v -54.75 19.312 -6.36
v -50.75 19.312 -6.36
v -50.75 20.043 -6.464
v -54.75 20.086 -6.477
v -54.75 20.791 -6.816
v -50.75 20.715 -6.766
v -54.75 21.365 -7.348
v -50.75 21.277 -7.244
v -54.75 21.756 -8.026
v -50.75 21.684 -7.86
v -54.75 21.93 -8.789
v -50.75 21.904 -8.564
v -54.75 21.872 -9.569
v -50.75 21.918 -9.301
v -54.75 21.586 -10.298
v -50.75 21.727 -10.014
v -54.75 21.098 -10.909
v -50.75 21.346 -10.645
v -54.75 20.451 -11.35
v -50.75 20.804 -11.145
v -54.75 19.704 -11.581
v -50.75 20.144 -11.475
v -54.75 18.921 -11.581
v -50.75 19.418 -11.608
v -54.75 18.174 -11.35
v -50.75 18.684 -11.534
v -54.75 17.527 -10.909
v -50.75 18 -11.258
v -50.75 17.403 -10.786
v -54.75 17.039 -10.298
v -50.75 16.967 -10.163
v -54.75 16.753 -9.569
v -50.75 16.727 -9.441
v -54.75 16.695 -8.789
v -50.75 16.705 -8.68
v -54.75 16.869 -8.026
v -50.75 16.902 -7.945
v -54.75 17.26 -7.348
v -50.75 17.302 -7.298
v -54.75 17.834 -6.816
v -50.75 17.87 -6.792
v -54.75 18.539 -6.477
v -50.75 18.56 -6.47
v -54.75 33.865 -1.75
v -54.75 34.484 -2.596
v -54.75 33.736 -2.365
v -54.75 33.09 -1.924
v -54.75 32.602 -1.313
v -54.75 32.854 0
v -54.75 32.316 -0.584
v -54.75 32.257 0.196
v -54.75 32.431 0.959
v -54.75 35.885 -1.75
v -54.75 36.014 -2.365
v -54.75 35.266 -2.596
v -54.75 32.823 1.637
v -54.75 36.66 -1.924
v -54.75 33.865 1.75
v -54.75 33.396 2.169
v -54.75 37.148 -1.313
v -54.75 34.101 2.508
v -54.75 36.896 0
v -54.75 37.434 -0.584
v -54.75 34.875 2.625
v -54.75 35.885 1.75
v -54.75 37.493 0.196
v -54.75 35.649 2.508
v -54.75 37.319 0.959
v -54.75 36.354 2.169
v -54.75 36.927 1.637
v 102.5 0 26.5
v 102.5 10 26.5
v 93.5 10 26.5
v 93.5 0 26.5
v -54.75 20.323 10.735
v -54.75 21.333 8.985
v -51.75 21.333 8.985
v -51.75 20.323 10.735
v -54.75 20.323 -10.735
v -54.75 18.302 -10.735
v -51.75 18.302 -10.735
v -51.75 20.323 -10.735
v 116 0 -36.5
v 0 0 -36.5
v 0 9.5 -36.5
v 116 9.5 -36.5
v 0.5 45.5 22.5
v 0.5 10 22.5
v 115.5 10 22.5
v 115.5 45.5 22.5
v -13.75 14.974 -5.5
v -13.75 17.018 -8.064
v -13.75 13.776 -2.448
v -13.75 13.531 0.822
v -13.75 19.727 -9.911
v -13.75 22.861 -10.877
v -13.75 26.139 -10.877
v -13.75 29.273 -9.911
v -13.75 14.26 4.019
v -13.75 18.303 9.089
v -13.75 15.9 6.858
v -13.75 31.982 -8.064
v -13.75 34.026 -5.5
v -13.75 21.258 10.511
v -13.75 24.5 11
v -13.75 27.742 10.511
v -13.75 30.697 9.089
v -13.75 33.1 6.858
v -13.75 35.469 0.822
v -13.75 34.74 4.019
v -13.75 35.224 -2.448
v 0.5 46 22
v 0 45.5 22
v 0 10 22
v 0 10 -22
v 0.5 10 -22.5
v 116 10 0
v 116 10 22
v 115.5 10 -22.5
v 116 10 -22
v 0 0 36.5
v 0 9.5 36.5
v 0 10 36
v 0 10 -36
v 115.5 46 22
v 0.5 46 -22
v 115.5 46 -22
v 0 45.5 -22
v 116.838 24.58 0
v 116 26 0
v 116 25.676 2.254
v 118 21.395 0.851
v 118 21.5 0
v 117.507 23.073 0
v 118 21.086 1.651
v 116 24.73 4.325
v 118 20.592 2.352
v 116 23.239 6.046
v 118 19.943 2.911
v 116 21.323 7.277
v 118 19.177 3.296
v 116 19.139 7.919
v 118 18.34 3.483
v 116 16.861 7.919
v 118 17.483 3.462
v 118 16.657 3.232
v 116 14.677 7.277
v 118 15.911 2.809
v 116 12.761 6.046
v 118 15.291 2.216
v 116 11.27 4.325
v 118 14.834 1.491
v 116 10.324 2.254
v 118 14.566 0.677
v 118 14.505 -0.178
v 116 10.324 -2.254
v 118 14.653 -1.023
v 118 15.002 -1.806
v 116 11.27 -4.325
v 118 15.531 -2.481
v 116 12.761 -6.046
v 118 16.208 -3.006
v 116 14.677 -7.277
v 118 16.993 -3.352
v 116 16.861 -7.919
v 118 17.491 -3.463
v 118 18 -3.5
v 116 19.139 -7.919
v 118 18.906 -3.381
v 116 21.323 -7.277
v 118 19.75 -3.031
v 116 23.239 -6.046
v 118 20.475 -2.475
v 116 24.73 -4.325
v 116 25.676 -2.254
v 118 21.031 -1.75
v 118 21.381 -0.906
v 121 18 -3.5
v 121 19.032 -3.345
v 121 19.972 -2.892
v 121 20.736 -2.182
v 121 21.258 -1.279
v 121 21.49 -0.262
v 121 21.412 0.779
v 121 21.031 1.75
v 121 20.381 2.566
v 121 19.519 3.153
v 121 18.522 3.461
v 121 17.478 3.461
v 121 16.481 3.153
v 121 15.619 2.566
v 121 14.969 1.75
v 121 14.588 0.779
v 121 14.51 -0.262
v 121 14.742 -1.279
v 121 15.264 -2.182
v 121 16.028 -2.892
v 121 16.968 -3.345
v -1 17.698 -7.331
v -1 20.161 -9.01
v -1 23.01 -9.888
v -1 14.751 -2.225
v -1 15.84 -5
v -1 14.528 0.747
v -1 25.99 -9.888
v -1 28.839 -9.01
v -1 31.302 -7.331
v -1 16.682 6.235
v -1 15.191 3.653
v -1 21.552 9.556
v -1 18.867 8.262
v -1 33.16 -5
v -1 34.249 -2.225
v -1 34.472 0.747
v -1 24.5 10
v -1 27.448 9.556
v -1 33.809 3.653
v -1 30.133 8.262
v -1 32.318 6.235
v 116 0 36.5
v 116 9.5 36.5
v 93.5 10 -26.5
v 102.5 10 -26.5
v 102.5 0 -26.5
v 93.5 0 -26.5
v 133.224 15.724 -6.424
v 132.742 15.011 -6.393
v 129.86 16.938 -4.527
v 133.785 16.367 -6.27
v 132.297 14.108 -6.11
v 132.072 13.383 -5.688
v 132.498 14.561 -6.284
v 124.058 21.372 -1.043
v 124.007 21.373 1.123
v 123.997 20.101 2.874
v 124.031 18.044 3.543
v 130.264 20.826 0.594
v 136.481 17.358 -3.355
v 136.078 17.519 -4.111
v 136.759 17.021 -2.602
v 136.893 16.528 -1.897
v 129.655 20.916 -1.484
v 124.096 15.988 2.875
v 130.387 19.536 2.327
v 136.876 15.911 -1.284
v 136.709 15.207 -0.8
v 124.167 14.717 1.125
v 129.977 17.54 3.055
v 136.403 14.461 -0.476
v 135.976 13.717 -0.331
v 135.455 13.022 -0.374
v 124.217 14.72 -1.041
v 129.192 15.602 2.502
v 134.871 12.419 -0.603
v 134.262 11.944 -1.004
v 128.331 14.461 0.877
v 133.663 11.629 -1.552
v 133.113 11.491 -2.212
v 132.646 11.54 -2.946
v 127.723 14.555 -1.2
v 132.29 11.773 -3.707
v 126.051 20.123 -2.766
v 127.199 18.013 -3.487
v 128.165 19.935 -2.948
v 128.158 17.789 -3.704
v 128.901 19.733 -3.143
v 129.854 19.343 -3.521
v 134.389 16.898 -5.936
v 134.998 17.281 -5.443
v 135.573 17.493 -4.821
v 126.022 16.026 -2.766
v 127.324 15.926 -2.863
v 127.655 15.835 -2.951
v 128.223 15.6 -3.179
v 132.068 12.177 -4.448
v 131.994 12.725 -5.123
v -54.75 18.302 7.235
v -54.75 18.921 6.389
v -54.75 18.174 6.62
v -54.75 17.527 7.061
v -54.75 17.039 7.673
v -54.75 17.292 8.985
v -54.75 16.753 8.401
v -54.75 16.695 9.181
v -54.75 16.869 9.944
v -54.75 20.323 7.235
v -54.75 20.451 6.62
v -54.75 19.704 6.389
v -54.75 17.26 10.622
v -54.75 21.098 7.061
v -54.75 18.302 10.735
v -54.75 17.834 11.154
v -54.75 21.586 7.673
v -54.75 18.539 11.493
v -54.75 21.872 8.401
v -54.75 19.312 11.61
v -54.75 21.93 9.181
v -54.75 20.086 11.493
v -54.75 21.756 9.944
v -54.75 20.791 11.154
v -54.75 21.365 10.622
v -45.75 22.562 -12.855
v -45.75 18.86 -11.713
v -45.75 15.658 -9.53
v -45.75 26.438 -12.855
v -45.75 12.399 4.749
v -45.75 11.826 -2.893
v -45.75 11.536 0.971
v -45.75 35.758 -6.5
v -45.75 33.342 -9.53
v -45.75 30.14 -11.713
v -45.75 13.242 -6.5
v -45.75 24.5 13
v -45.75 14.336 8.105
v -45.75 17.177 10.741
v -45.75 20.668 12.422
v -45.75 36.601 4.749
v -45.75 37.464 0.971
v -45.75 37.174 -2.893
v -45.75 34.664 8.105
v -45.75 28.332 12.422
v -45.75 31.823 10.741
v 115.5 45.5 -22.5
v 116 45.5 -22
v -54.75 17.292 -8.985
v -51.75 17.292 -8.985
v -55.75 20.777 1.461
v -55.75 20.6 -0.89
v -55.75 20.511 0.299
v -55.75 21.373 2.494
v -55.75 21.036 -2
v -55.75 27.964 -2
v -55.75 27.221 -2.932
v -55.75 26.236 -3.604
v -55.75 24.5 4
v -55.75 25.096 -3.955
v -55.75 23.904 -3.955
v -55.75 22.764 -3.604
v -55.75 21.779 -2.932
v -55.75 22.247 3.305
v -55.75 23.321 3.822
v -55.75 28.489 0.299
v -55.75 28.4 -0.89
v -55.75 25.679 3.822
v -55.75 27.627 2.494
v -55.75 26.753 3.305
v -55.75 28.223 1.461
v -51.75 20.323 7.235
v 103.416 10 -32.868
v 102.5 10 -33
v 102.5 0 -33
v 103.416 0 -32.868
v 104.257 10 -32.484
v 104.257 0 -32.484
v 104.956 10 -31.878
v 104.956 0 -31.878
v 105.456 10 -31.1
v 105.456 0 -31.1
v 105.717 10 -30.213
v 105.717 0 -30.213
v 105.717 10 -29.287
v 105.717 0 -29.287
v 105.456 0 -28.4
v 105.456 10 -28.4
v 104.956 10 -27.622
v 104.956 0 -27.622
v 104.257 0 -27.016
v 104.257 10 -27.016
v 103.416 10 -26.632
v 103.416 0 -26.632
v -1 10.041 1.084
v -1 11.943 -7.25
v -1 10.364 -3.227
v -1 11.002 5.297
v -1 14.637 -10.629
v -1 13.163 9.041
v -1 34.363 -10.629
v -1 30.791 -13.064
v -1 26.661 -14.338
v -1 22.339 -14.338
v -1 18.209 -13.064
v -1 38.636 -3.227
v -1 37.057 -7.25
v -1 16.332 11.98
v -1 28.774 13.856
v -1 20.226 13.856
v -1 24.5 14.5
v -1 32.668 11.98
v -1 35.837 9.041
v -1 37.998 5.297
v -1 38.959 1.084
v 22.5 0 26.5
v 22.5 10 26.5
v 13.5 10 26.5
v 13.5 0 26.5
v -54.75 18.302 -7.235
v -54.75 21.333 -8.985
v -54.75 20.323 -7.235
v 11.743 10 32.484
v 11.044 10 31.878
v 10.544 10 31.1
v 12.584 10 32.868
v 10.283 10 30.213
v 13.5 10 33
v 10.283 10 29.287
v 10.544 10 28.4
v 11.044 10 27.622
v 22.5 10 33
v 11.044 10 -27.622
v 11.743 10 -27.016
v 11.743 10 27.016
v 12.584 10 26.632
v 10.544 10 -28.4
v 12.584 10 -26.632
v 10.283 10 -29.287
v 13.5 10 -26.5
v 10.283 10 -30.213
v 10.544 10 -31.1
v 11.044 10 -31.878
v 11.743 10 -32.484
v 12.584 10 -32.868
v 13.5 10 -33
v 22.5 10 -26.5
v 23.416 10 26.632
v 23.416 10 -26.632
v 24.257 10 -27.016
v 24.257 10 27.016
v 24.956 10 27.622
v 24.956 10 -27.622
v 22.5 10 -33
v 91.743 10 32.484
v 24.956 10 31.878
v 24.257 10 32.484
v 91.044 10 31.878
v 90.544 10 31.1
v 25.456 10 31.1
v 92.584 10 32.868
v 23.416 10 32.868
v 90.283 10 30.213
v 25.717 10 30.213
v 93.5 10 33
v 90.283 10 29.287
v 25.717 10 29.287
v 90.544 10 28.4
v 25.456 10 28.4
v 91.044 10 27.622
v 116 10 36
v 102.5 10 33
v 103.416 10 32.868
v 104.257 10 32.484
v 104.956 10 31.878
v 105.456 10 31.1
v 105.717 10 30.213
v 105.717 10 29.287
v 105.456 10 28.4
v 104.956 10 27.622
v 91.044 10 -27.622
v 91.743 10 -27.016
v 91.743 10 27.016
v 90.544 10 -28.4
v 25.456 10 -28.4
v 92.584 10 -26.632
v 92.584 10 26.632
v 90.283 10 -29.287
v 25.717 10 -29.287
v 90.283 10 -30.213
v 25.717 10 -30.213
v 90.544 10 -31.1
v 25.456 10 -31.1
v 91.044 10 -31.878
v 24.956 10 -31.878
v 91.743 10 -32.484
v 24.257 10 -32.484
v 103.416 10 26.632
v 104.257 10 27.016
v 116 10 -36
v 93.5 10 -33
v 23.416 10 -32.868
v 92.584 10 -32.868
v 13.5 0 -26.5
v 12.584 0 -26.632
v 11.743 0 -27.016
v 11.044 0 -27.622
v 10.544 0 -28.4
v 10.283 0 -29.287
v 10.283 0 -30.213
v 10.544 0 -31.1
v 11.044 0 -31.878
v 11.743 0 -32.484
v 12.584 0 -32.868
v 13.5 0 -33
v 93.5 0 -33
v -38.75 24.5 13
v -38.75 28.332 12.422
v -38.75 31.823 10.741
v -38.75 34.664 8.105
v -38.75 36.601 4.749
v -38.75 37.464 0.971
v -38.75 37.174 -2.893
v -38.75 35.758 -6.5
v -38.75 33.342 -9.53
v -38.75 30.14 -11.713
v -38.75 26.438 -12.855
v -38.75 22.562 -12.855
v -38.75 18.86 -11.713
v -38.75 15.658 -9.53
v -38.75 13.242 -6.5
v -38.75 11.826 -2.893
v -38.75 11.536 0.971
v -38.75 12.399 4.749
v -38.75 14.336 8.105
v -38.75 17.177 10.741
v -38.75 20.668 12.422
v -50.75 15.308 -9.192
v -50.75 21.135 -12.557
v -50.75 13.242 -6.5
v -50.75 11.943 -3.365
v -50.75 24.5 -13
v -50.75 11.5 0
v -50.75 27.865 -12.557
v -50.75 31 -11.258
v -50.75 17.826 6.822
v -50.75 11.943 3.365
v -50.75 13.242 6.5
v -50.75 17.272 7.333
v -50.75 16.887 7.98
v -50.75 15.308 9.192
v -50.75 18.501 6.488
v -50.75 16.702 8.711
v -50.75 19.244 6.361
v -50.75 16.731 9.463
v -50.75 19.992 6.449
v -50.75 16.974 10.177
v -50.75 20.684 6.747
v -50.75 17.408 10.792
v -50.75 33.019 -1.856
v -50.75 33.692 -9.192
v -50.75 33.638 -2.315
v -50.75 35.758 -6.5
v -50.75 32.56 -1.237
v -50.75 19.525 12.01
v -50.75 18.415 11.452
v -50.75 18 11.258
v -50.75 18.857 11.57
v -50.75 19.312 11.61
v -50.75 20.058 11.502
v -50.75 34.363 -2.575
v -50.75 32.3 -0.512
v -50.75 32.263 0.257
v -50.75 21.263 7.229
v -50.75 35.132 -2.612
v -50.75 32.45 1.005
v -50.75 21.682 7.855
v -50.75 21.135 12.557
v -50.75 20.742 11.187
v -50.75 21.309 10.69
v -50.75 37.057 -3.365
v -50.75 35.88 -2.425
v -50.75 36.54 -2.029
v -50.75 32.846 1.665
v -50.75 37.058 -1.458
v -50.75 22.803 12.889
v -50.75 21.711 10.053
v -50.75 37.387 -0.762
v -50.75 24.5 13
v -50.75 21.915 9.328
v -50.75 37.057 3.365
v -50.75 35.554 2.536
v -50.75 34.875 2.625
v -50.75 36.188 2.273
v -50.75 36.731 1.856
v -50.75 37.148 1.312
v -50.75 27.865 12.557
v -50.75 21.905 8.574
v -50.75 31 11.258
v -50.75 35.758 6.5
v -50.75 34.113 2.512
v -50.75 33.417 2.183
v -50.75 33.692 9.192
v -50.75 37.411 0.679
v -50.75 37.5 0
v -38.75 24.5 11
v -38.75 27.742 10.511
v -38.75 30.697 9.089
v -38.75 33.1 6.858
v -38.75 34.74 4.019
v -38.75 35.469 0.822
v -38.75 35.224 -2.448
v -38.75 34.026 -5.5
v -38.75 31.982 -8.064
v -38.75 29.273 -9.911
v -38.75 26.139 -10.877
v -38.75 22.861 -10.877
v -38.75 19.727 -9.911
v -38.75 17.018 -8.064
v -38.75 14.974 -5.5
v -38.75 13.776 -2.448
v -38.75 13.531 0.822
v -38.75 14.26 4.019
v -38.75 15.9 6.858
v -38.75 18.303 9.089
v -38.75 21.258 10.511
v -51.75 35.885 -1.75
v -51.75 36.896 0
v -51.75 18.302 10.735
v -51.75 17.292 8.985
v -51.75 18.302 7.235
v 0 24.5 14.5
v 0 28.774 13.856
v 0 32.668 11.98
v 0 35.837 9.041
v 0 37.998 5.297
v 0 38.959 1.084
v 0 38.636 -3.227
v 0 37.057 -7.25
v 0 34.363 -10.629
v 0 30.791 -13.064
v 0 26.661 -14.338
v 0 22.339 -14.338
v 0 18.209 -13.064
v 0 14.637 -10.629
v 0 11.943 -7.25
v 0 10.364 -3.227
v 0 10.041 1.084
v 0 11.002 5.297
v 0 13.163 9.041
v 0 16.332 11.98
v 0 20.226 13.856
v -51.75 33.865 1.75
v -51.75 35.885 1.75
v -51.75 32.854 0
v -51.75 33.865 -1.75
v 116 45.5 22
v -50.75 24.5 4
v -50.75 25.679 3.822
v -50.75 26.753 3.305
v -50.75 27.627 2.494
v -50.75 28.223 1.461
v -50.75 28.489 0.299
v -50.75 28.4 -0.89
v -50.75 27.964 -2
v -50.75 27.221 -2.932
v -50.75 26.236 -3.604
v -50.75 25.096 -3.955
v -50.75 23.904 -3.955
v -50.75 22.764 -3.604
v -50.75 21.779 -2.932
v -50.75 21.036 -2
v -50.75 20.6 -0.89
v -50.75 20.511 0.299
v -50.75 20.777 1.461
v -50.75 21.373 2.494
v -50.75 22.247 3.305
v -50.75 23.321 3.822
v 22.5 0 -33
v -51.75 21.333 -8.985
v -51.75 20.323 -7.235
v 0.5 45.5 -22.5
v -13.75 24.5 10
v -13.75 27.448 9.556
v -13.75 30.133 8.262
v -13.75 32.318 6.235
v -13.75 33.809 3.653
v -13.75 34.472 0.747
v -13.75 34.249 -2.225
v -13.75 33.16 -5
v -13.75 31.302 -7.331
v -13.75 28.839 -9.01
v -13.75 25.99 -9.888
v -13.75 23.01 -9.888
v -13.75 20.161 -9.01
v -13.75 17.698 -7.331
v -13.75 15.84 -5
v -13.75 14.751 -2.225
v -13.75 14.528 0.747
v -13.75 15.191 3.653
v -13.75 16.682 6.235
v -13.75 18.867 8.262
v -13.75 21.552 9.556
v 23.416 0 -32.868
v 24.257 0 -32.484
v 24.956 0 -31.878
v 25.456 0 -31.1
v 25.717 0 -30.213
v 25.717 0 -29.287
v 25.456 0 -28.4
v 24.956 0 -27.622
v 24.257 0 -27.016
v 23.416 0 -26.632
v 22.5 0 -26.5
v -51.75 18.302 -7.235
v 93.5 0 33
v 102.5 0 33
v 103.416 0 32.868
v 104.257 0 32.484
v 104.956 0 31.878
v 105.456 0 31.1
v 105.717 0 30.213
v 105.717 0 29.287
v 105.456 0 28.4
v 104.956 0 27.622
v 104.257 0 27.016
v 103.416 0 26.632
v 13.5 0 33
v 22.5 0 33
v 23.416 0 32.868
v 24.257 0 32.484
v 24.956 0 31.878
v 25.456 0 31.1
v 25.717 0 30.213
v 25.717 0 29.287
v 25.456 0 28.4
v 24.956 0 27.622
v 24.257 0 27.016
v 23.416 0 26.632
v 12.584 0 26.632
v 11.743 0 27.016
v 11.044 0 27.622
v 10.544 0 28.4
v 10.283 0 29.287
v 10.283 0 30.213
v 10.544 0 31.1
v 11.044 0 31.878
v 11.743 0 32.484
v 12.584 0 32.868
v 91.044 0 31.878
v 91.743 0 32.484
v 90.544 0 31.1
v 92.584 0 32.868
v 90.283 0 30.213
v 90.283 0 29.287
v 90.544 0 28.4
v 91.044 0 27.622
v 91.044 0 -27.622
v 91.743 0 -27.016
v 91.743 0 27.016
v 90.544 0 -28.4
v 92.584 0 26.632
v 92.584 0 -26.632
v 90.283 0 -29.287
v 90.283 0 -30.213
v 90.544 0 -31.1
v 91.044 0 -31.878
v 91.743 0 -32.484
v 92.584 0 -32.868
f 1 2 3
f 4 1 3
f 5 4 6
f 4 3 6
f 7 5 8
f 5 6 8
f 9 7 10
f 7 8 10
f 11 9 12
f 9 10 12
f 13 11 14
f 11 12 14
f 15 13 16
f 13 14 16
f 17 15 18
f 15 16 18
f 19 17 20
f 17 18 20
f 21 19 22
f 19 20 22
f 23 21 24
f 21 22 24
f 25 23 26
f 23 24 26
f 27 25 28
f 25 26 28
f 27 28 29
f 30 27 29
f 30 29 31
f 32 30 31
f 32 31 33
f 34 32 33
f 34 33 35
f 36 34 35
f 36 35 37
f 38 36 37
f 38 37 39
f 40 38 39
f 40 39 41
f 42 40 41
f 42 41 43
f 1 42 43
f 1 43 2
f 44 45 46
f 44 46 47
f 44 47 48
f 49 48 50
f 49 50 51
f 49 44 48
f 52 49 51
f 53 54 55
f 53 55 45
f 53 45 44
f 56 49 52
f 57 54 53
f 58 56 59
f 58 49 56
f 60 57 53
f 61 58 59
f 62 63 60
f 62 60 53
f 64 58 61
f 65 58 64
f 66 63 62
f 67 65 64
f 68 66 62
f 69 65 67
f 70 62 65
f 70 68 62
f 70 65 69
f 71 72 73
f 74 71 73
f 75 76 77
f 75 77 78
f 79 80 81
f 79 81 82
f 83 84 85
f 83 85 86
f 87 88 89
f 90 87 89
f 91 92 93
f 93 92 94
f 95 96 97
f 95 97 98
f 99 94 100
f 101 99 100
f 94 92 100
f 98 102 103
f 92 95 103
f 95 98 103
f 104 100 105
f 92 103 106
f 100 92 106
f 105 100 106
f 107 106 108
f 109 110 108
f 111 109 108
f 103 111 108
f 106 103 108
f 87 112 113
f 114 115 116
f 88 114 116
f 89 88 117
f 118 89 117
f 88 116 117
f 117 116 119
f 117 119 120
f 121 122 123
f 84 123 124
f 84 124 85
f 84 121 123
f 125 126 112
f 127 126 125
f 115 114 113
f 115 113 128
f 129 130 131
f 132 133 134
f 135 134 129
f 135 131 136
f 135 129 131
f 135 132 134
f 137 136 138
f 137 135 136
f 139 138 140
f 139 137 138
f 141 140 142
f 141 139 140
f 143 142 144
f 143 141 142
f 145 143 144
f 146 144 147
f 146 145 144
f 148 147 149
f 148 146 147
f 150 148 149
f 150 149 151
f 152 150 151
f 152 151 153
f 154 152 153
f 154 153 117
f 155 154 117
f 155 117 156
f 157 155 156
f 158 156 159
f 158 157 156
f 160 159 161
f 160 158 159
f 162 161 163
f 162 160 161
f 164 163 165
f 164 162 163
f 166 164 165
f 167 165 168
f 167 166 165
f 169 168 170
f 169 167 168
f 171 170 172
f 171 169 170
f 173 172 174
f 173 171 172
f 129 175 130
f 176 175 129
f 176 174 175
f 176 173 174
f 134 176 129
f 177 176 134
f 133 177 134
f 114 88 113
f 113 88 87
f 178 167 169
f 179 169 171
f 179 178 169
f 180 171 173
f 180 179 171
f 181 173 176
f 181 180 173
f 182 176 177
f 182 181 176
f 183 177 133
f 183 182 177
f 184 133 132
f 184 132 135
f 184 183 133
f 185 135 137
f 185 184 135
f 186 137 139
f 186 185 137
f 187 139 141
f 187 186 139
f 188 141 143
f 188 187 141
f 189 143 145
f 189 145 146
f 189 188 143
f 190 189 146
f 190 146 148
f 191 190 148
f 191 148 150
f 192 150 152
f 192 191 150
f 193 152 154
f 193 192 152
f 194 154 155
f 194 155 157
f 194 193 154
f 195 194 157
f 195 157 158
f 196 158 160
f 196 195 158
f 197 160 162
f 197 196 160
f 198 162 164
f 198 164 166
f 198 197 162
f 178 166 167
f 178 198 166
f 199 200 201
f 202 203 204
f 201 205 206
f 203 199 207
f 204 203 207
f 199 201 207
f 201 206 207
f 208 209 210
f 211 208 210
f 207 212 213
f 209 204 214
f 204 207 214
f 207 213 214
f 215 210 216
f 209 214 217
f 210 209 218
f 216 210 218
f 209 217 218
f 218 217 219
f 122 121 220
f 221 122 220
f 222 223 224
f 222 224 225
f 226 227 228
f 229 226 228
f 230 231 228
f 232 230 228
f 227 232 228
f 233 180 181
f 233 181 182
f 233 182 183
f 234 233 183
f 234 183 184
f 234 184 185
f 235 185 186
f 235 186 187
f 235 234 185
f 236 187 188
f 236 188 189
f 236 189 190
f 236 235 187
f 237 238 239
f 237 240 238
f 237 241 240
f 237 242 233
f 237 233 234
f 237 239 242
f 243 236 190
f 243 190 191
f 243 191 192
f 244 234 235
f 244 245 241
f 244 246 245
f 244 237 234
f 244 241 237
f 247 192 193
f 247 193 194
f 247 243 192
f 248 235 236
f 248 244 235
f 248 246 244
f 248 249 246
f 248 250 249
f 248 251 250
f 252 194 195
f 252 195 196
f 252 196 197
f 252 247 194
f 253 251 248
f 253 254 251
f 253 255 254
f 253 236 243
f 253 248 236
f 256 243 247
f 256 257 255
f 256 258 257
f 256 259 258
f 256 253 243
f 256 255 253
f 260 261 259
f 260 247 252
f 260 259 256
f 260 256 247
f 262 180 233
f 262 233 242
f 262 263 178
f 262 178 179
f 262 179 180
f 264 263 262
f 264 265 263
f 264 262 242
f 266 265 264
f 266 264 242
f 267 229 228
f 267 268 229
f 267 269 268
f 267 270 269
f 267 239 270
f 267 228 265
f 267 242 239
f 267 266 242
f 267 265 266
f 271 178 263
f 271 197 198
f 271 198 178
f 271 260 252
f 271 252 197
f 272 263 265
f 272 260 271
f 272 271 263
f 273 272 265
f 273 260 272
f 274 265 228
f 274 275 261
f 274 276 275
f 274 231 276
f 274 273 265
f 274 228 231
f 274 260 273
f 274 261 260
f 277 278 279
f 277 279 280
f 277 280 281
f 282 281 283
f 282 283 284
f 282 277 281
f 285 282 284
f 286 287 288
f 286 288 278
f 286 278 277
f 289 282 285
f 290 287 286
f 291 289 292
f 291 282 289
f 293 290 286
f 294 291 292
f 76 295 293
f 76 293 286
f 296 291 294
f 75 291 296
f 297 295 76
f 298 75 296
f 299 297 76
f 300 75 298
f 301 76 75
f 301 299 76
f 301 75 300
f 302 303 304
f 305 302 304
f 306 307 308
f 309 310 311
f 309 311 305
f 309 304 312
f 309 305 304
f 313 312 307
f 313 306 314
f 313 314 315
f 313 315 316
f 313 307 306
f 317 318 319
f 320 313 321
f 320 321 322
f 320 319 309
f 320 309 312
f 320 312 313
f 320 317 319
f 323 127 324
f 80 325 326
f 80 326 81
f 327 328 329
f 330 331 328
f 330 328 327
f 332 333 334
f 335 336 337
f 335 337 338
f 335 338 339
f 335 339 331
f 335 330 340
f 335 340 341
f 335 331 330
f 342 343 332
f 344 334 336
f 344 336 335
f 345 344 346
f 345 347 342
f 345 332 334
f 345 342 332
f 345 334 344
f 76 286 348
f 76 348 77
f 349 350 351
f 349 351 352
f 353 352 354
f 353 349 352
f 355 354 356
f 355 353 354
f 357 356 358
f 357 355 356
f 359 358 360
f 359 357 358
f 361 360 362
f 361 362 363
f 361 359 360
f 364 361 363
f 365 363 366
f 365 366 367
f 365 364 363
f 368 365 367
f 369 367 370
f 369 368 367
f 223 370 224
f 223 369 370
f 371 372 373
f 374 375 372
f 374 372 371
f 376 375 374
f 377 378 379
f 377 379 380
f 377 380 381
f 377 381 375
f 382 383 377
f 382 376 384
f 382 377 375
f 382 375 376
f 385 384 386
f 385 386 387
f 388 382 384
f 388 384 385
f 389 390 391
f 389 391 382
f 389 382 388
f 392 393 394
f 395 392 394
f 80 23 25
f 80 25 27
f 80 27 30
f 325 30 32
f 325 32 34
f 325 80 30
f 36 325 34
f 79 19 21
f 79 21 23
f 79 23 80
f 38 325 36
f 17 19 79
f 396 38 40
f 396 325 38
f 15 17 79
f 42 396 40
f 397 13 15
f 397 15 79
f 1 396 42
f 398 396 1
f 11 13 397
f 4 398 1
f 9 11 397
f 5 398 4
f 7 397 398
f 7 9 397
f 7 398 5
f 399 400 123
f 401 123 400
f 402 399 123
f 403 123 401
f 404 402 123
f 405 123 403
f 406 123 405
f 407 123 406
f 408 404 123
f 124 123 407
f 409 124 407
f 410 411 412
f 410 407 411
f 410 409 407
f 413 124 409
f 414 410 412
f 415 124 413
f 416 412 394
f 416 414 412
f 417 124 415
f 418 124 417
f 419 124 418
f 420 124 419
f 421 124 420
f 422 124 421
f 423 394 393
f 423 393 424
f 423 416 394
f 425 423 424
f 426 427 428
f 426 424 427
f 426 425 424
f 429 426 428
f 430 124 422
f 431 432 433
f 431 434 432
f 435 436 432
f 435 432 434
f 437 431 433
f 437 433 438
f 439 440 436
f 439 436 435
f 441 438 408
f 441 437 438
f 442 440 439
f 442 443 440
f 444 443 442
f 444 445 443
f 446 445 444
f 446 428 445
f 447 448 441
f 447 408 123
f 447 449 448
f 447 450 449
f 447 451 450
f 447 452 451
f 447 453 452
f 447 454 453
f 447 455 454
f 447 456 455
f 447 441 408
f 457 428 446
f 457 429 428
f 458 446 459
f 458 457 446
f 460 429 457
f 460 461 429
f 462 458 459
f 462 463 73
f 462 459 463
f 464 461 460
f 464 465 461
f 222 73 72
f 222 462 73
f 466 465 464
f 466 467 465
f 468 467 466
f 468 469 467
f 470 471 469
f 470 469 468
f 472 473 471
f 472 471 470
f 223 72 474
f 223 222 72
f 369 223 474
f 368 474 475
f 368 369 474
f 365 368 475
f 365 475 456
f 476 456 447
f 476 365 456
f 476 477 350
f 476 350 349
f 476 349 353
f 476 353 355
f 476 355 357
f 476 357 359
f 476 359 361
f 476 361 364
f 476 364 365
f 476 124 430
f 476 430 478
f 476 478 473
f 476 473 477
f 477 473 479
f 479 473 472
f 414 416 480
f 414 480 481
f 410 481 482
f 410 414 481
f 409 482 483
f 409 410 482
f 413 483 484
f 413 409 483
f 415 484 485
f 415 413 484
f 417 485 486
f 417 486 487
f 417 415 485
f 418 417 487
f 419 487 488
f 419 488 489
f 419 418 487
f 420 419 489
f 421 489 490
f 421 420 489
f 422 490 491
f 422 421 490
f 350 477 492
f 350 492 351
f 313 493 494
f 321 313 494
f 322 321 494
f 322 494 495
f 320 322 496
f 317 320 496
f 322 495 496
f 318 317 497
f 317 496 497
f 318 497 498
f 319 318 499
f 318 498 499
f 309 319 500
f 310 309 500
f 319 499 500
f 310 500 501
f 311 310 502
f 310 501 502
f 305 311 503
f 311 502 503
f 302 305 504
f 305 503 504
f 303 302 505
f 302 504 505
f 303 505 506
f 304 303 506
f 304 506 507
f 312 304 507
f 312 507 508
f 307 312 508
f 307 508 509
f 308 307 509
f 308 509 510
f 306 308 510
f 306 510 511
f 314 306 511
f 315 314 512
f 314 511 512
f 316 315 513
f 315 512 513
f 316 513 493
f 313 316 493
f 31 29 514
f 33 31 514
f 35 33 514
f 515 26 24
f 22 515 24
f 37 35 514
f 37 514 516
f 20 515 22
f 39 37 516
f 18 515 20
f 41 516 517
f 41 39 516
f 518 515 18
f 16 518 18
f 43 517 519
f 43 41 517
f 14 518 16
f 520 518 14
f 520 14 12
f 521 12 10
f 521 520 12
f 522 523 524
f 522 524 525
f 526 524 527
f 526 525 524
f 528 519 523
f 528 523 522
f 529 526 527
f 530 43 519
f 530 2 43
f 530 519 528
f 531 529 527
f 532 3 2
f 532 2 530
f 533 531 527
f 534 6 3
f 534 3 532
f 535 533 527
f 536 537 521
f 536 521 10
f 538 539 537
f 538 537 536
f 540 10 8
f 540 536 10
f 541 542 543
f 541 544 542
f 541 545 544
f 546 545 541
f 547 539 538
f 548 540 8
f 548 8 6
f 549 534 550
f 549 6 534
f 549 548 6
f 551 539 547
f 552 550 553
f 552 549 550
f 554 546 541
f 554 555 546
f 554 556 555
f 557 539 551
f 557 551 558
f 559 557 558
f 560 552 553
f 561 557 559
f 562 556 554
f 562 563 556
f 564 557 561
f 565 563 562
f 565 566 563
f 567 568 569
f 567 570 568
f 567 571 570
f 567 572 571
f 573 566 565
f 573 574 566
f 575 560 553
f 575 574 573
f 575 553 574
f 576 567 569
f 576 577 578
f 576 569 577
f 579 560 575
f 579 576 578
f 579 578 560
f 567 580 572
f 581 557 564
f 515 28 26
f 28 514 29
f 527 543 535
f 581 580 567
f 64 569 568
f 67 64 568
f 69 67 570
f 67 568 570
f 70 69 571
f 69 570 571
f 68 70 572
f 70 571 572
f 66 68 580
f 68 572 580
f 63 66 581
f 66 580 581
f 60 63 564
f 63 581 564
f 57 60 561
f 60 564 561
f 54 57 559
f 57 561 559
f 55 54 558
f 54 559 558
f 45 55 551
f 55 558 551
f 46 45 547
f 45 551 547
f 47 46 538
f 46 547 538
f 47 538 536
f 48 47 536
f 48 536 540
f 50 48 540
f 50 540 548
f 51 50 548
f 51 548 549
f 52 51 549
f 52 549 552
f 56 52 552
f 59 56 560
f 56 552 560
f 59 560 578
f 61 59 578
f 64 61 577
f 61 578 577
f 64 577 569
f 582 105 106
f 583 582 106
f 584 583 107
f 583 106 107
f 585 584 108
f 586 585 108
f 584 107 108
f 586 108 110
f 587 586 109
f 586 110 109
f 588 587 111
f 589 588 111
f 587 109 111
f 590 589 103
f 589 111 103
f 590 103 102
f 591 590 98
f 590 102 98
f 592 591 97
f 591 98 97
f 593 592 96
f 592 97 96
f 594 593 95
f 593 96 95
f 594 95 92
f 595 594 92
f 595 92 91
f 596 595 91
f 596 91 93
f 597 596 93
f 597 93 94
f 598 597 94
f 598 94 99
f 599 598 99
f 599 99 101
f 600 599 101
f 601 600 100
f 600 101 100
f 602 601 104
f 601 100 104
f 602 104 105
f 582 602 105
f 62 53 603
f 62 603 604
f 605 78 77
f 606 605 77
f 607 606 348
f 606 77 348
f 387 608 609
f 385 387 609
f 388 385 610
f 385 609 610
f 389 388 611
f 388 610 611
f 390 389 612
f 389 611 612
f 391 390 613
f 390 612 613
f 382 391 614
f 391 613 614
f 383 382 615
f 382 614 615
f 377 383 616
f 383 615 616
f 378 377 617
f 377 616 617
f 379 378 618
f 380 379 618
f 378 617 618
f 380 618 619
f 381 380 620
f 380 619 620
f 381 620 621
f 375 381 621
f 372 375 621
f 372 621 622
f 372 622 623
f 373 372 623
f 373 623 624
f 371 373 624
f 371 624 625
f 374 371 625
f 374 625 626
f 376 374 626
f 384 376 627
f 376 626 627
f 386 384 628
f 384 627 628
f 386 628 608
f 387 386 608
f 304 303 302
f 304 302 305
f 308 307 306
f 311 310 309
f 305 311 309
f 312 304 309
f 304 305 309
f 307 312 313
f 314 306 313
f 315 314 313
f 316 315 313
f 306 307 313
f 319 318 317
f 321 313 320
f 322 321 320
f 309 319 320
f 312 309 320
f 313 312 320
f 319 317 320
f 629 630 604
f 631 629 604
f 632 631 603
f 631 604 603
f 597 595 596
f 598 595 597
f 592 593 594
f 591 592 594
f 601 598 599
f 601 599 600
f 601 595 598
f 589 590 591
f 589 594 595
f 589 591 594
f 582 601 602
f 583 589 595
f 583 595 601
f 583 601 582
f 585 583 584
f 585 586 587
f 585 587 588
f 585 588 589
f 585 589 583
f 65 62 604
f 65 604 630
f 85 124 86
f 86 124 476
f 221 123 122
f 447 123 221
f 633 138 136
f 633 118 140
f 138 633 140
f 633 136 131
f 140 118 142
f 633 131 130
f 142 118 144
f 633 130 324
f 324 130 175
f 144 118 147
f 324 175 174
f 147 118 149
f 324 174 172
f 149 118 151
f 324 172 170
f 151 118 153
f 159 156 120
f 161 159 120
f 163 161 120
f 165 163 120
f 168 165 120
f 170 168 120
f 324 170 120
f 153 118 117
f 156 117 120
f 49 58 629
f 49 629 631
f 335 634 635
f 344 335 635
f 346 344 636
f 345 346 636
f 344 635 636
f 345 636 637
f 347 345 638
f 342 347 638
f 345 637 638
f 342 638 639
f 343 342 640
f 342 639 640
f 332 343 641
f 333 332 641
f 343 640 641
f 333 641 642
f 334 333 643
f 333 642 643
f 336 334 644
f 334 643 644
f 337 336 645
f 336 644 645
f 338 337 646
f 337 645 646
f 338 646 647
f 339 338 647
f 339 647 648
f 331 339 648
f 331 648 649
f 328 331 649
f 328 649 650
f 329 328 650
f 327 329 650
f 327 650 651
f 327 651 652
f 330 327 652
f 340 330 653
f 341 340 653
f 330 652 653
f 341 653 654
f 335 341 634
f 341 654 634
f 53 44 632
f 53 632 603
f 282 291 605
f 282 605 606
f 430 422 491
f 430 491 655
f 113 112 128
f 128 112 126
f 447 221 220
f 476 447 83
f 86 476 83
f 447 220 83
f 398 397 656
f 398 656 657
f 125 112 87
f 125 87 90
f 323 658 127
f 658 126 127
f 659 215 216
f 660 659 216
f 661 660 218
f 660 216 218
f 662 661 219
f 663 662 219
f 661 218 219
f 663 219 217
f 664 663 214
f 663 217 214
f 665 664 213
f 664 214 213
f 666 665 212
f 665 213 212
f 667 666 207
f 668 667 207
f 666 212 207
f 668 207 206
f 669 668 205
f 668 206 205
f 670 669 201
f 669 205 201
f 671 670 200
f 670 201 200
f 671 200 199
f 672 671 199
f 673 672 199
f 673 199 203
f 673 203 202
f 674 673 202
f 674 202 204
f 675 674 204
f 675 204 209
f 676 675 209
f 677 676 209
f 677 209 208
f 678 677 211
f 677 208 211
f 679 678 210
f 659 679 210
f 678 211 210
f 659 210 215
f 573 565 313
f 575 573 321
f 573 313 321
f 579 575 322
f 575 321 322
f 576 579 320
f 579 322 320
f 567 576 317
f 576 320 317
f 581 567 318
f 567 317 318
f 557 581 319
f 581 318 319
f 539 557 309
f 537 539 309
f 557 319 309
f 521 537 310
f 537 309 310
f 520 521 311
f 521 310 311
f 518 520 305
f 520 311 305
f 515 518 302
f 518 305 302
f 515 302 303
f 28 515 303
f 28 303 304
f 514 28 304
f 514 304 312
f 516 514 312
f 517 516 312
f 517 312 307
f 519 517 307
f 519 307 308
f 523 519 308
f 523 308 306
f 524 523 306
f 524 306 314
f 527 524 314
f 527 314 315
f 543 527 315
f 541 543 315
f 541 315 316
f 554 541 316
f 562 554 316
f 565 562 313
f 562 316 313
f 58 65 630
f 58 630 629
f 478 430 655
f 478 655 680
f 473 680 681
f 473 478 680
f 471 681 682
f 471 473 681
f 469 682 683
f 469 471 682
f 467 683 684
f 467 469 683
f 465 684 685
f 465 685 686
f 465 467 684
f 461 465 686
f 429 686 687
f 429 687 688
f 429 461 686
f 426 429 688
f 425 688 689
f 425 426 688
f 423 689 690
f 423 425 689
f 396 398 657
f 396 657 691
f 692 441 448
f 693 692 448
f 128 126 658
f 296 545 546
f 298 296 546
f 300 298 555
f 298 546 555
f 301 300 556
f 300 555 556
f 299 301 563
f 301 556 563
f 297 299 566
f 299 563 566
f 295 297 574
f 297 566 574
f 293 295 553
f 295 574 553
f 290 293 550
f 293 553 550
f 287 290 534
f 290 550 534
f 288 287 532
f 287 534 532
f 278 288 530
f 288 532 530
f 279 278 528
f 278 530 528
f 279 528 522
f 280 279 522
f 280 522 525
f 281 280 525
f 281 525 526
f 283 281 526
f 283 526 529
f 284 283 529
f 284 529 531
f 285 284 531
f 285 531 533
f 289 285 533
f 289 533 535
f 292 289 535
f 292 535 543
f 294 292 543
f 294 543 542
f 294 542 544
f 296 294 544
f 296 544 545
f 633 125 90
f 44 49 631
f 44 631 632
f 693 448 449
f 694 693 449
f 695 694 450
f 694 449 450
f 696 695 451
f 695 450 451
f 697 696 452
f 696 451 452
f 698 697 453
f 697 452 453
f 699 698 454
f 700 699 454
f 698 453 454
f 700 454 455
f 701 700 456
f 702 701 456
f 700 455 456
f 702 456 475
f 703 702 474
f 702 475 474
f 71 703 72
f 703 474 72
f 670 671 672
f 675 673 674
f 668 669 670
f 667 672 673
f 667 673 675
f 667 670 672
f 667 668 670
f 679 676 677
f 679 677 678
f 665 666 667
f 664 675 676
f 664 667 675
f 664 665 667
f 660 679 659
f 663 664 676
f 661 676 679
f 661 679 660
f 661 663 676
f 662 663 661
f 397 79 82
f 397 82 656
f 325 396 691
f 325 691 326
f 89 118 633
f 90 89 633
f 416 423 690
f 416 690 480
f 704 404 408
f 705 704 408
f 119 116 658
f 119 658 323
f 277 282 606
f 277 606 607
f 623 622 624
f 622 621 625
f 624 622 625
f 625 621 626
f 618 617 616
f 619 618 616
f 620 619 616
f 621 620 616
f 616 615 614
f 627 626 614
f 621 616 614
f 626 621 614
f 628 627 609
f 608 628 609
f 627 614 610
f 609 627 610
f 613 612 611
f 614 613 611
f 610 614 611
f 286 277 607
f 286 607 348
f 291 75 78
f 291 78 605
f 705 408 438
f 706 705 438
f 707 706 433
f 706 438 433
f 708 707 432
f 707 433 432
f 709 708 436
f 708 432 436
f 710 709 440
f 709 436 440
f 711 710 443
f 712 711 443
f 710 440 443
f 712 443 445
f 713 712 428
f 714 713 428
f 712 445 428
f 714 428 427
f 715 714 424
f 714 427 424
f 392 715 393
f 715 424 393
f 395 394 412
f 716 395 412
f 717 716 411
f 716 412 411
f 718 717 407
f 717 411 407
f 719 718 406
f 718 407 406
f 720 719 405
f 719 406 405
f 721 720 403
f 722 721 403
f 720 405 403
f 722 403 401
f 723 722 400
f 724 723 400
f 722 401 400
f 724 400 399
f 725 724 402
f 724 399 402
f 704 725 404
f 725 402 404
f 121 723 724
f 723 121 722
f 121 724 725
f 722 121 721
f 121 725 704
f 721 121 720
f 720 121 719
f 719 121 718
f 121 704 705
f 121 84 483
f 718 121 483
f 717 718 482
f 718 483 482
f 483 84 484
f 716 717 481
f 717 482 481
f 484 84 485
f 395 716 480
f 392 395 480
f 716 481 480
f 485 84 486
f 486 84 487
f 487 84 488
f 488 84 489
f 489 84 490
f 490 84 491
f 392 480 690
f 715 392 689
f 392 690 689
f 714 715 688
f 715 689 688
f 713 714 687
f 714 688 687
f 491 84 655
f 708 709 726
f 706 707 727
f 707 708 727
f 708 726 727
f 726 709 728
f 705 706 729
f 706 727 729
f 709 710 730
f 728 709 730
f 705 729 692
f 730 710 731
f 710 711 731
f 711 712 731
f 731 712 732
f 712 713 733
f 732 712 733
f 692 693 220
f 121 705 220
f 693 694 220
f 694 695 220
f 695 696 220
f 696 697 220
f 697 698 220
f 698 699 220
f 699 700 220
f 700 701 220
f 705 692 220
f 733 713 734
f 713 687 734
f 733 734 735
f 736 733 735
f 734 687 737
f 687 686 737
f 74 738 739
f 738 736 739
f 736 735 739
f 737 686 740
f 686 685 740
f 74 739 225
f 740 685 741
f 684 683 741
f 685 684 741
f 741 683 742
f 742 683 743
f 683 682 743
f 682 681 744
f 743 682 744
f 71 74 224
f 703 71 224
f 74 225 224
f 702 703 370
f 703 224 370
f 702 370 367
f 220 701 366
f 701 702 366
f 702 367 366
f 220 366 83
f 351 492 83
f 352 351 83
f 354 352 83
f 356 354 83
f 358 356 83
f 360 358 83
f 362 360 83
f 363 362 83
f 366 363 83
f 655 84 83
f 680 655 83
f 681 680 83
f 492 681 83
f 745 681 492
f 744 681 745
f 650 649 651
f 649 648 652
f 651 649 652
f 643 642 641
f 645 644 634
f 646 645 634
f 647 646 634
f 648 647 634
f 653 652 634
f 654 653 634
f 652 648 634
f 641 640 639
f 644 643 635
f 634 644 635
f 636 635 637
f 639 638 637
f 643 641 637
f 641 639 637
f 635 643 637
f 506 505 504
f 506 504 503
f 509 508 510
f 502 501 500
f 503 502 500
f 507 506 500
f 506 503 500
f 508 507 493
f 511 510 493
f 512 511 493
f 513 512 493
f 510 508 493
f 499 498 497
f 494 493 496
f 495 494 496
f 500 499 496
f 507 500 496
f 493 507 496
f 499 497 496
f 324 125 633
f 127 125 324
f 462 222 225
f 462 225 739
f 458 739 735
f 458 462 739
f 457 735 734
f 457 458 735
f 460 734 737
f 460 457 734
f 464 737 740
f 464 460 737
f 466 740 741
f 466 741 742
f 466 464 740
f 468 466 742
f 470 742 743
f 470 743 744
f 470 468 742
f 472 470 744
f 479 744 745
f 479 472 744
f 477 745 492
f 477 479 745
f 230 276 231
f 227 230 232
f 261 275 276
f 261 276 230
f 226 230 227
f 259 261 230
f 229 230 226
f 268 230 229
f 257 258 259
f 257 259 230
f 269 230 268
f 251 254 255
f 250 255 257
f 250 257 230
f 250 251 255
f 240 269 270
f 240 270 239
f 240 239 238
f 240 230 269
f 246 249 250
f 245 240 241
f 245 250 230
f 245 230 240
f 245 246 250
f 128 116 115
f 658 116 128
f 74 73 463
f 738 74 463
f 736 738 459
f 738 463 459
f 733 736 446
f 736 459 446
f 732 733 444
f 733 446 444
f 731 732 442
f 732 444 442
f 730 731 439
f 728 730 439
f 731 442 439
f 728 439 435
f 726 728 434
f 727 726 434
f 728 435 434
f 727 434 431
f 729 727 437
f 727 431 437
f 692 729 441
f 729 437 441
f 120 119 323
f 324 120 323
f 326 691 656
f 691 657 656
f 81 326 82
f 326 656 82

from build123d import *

# Parameters (mm, degrees)
SKETCH1_W           = 116
SKETCH1_H           = 73
BOSS_EXTRUDE1_DEPTH = 10
SKETCH2_W           = 116
SKETCH2_H           = 45
BOSS_EXTRUDE2_DEPTH = 36
SKETCH3_R           = 14.5
BOSS_EXTRUDE3_DEPTH = 1
SKETCH4_R           = 10
BOSS_EXTRUDE4_DEPTH = 12.75
SKETCH5_R           = 11
BOSS_EXTRUDE5_DEPTH = 25
SKETCH6_R           = 13
BOSS_EXTRUDE6_DEPTH = 7
SKETCH7_R           = 13
BOSS_EXTRUDE7_DEPTH = 5
SKETCH8_R           = 4
BOSS_EXTRUDE8_DEPTH = 5
CUT_EXTRUDE1_DEPTH  = 10
CHAMFER1_SIZE       = 0.5
CHAMFER2_SIZE       = 0.5
SKETCH10_R          = 3.5
SKETCH13_R          = 2.625
BOSS_EXTRUDE9_DEPTH = 4
CUT_EXTRUDE2_DEPTH  = 3


with BuildPart() as part:
    # Sketch1 → Boss-Extrude1 (new body)
    with BuildSketch(Plane(origin=(0, 0, 0), x_dir=(1, 0, 0), z_dir=(0, 1, 0))):
        with Locations((58, 0)):
            Rectangle(SKETCH1_W, SKETCH1_H)
    extrude(amount=BOSS_EXTRUDE1_DEPTH)

    # Sketch9 → Cut-Extrude1 (cut)
    with BuildSketch(Plane(origin=(0, 10, 0), x_dir=(1, 0, 0), z_dir=(0, 1, 0))):
        with BuildLine():
            Line((13.5, 33), (22.5, 33))
            ThreePointArc((22.5, 33), (25.75, 29.75), (22.5, 26.5))
            Line((22.5, 26.5), (13.5, 26.5))
            ThreePointArc((13.5, 26.5), (10.25, 29.75), (13.5, 33))
        make_face()
        with BuildLine():
            Line((93.5, 33), (102.5, 33))
            ThreePointArc((102.5, 33), (105.75, 29.75), (102.5, 26.5))
            Line((102.5, 26.5), (93.5, 26.5))
            ThreePointArc((93.5, 26.5), (90.25, 29.75), (93.5, 33))
        make_face()
        with BuildLine():
            Line((13.5, -33), (22.5, -33))
            ThreePointArc((22.5, -33), (25.75, -29.75), (22.5, -26.5))
            Line((22.5, -26.5), (13.5, -26.5))
            ThreePointArc((13.5, -26.5), (10.25, -29.75), (13.5, -33))
        make_face()
        with BuildLine():
            Line((93.5, -33), (102.5, -33))
            ThreePointArc((102.5, -33), (105.75, -29.75), (102.5, -26.5))
            Line((102.5, -26.5), (93.5, -26.5))
            ThreePointArc((93.5, -26.5), (90.25, -29.75), (93.5, -33))
        make_face()
    extrude(amount=-CUT_EXTRUDE1_DEPTH, mode=Mode.SUBTRACT)

    # Chamfer1
    chamfer1_edges = [part.edges().sort_by_distance(p)[0] for p in [
        (58, 10, -36.5),
        (58, 10, 36.5),
    ]]
    chamfer(chamfer1_edges, length=CHAMFER1_SIZE)


with BuildPart() as body_2:
    # Sketch2 → Boss-Extrude2 (new body)
    with BuildSketch(Plane(origin=(0, 10, 0), x_dir=(1, 0, 0), z_dir=(0, 1, 0))):
        with Locations((58, 0)):
            Rectangle(SKETCH2_W, SKETCH2_H)
    extrude(amount=BOSS_EXTRUDE2_DEPTH)

    # Chamfer2
    chamfer2_edges = [body_2.edges().sort_by_distance(p)[0] for p in [
        (116, 46, 0),
        (58, 46, -22.5),
        (0, 46, 0),
        (58, 46, 22.5),
        (0, 28, -22.5),
        (116, 28, -22.5),
        (116, 28, 22.5),
        (0, 28, 22.5),
    ]]
    chamfer(chamfer2_edges, length=CHAMFER2_SIZE)

    # Sweep1: sweep along a curve in space
    with BuildLine() as sweep1_path:
        Line((116, 18, 0), (121, 18, 0))
        add(Edge.make_bspline(
            [(121, 18, 0), (128.398710809, 18, 0), (128.249160874, 18.894172802, 0.865355974), (134.449130149, 14.508245339, -3.37922463)],
            knots=[0, 0, 0, 0, 1, 1, 1, 1], degree=3))
    # Sketch10 → Sweep1 (sweep)
    with BuildSketch(Plane(origin=(116, 0, 0), x_dir=(0, 0, -1), z_dir=(1, 0, 0))):
        with Locations((0, 18)):
            Circle(SKETCH10_R)
    sweep(path=sweep1_path.line)

    # Sketch11 → Revolve1 (revolve)
    with BuildSketch(Plane(origin=(0, 0, 0), x_dir=(-1, 0, 0), z_dir=(0, 0, -1))):
        with BuildLine():
            Line((-116, 18), (-116, 26))
            ThreePointArc((-116, 26), (-117.8111125, 22.18085644), (-118.432743778, 18))
            Line((-118.432743778, 18), (-116, 18))
        make_face()
    revolve(axis=Axis((116, 18, 0), (1, 0, 0)))


with BuildPart() as body_3:
    # Sketch3 → Boss-Extrude3 (new body)
    with BuildSketch(Plane.ZY):
        with Locations((0, 24.5)):
            Circle(SKETCH3_R)
    extrude(amount=BOSS_EXTRUDE3_DEPTH)


with BuildPart() as body_4:
    # Sketch4 → Boss-Extrude4 (new body)
    with BuildSketch(Plane.ZY.offset(1)):
        with Locations((0, 24.5)):
            Circle(SKETCH4_R)
    extrude(amount=BOSS_EXTRUDE4_DEPTH)


with BuildPart() as body_5:
    # Sketch5 → Boss-Extrude5 (new body)
    with BuildSketch(Plane.ZY.offset(13.75)):
        with Locations((0, 24.5)):
            Circle(SKETCH5_R)
    extrude(amount=BOSS_EXTRUDE5_DEPTH)


with BuildPart() as body_6:
    # Sketch6 → Boss-Extrude6 (new body)
    with BuildSketch(Plane.ZY.offset(38.75)):
        with Locations((0, 24.5)):
            Circle(SKETCH6_R)
    extrude(amount=BOSS_EXTRUDE6_DEPTH)


with BuildPart() as body_7:
    # Sketch7 → Boss-Extrude7 (new body)
    with BuildSketch(Plane.ZY.offset(45.75)):
        with Locations((0, 24.5)):
            Circle(SKETCH7_R)
    extrude(amount=BOSS_EXTRUDE7_DEPTH)

    # Sketch13 → Boss-Extrude9 (add)
    with BuildSketch(Plane.ZY.offset(50.75)):
        with Locations((0, 34.875)):
            Circle(SKETCH13_R)
        with Locations((8.985013564, 19.3125)):
            Circle(SKETCH13_R)
        with Locations((-8.985013564, 19.3125)):
            Circle(SKETCH13_R)
    extrude(amount=BOSS_EXTRUDE9_DEPTH)

    # Sketch14 → Cut-Extrude2 (cut)
    with BuildSketch(Plane.ZY.offset(54.75)):
        Polygon((-1.75, 35.885362971), (0, 36.895725942), (1.75, 35.885362971), (1.75, 33.864637029), (0, 32.854274058), (-1.75, 33.864637029), align=None)
        Polygon((-7.235013564, 18.302137029), (-8.985013564, 17.291774058), (-10.735013564, 18.302137029), (-10.735013564, 20.322862971), (-8.985013564, 21.333225942), (-7.235013564, 20.322862971), align=None)
        Polygon((8.985013564, 21.333225942), (10.735013564, 20.322862971), (10.735013564, 18.302137029), (8.985013564, 17.291774058), (7.235013564, 18.302137029), (7.235013564, 20.322862971), align=None)
    extrude(amount=-CUT_EXTRUDE2_DEPTH, mode=Mode.SUBTRACT)


with BuildPart() as body_8:
    # Sketch8 → Boss-Extrude8 (new body)
    with BuildSketch(Plane.ZY.offset(50.75)):
        with Locations((0, 24.5)):
            Circle(SKETCH8_R)
    extrude(amount=BOSS_EXTRUDE8_DEPTH)


solid = Compound([part.part, body_2.part, body_3.part, body_4.part, body_5.part, body_6.part, body_7.part, body_8.part])
